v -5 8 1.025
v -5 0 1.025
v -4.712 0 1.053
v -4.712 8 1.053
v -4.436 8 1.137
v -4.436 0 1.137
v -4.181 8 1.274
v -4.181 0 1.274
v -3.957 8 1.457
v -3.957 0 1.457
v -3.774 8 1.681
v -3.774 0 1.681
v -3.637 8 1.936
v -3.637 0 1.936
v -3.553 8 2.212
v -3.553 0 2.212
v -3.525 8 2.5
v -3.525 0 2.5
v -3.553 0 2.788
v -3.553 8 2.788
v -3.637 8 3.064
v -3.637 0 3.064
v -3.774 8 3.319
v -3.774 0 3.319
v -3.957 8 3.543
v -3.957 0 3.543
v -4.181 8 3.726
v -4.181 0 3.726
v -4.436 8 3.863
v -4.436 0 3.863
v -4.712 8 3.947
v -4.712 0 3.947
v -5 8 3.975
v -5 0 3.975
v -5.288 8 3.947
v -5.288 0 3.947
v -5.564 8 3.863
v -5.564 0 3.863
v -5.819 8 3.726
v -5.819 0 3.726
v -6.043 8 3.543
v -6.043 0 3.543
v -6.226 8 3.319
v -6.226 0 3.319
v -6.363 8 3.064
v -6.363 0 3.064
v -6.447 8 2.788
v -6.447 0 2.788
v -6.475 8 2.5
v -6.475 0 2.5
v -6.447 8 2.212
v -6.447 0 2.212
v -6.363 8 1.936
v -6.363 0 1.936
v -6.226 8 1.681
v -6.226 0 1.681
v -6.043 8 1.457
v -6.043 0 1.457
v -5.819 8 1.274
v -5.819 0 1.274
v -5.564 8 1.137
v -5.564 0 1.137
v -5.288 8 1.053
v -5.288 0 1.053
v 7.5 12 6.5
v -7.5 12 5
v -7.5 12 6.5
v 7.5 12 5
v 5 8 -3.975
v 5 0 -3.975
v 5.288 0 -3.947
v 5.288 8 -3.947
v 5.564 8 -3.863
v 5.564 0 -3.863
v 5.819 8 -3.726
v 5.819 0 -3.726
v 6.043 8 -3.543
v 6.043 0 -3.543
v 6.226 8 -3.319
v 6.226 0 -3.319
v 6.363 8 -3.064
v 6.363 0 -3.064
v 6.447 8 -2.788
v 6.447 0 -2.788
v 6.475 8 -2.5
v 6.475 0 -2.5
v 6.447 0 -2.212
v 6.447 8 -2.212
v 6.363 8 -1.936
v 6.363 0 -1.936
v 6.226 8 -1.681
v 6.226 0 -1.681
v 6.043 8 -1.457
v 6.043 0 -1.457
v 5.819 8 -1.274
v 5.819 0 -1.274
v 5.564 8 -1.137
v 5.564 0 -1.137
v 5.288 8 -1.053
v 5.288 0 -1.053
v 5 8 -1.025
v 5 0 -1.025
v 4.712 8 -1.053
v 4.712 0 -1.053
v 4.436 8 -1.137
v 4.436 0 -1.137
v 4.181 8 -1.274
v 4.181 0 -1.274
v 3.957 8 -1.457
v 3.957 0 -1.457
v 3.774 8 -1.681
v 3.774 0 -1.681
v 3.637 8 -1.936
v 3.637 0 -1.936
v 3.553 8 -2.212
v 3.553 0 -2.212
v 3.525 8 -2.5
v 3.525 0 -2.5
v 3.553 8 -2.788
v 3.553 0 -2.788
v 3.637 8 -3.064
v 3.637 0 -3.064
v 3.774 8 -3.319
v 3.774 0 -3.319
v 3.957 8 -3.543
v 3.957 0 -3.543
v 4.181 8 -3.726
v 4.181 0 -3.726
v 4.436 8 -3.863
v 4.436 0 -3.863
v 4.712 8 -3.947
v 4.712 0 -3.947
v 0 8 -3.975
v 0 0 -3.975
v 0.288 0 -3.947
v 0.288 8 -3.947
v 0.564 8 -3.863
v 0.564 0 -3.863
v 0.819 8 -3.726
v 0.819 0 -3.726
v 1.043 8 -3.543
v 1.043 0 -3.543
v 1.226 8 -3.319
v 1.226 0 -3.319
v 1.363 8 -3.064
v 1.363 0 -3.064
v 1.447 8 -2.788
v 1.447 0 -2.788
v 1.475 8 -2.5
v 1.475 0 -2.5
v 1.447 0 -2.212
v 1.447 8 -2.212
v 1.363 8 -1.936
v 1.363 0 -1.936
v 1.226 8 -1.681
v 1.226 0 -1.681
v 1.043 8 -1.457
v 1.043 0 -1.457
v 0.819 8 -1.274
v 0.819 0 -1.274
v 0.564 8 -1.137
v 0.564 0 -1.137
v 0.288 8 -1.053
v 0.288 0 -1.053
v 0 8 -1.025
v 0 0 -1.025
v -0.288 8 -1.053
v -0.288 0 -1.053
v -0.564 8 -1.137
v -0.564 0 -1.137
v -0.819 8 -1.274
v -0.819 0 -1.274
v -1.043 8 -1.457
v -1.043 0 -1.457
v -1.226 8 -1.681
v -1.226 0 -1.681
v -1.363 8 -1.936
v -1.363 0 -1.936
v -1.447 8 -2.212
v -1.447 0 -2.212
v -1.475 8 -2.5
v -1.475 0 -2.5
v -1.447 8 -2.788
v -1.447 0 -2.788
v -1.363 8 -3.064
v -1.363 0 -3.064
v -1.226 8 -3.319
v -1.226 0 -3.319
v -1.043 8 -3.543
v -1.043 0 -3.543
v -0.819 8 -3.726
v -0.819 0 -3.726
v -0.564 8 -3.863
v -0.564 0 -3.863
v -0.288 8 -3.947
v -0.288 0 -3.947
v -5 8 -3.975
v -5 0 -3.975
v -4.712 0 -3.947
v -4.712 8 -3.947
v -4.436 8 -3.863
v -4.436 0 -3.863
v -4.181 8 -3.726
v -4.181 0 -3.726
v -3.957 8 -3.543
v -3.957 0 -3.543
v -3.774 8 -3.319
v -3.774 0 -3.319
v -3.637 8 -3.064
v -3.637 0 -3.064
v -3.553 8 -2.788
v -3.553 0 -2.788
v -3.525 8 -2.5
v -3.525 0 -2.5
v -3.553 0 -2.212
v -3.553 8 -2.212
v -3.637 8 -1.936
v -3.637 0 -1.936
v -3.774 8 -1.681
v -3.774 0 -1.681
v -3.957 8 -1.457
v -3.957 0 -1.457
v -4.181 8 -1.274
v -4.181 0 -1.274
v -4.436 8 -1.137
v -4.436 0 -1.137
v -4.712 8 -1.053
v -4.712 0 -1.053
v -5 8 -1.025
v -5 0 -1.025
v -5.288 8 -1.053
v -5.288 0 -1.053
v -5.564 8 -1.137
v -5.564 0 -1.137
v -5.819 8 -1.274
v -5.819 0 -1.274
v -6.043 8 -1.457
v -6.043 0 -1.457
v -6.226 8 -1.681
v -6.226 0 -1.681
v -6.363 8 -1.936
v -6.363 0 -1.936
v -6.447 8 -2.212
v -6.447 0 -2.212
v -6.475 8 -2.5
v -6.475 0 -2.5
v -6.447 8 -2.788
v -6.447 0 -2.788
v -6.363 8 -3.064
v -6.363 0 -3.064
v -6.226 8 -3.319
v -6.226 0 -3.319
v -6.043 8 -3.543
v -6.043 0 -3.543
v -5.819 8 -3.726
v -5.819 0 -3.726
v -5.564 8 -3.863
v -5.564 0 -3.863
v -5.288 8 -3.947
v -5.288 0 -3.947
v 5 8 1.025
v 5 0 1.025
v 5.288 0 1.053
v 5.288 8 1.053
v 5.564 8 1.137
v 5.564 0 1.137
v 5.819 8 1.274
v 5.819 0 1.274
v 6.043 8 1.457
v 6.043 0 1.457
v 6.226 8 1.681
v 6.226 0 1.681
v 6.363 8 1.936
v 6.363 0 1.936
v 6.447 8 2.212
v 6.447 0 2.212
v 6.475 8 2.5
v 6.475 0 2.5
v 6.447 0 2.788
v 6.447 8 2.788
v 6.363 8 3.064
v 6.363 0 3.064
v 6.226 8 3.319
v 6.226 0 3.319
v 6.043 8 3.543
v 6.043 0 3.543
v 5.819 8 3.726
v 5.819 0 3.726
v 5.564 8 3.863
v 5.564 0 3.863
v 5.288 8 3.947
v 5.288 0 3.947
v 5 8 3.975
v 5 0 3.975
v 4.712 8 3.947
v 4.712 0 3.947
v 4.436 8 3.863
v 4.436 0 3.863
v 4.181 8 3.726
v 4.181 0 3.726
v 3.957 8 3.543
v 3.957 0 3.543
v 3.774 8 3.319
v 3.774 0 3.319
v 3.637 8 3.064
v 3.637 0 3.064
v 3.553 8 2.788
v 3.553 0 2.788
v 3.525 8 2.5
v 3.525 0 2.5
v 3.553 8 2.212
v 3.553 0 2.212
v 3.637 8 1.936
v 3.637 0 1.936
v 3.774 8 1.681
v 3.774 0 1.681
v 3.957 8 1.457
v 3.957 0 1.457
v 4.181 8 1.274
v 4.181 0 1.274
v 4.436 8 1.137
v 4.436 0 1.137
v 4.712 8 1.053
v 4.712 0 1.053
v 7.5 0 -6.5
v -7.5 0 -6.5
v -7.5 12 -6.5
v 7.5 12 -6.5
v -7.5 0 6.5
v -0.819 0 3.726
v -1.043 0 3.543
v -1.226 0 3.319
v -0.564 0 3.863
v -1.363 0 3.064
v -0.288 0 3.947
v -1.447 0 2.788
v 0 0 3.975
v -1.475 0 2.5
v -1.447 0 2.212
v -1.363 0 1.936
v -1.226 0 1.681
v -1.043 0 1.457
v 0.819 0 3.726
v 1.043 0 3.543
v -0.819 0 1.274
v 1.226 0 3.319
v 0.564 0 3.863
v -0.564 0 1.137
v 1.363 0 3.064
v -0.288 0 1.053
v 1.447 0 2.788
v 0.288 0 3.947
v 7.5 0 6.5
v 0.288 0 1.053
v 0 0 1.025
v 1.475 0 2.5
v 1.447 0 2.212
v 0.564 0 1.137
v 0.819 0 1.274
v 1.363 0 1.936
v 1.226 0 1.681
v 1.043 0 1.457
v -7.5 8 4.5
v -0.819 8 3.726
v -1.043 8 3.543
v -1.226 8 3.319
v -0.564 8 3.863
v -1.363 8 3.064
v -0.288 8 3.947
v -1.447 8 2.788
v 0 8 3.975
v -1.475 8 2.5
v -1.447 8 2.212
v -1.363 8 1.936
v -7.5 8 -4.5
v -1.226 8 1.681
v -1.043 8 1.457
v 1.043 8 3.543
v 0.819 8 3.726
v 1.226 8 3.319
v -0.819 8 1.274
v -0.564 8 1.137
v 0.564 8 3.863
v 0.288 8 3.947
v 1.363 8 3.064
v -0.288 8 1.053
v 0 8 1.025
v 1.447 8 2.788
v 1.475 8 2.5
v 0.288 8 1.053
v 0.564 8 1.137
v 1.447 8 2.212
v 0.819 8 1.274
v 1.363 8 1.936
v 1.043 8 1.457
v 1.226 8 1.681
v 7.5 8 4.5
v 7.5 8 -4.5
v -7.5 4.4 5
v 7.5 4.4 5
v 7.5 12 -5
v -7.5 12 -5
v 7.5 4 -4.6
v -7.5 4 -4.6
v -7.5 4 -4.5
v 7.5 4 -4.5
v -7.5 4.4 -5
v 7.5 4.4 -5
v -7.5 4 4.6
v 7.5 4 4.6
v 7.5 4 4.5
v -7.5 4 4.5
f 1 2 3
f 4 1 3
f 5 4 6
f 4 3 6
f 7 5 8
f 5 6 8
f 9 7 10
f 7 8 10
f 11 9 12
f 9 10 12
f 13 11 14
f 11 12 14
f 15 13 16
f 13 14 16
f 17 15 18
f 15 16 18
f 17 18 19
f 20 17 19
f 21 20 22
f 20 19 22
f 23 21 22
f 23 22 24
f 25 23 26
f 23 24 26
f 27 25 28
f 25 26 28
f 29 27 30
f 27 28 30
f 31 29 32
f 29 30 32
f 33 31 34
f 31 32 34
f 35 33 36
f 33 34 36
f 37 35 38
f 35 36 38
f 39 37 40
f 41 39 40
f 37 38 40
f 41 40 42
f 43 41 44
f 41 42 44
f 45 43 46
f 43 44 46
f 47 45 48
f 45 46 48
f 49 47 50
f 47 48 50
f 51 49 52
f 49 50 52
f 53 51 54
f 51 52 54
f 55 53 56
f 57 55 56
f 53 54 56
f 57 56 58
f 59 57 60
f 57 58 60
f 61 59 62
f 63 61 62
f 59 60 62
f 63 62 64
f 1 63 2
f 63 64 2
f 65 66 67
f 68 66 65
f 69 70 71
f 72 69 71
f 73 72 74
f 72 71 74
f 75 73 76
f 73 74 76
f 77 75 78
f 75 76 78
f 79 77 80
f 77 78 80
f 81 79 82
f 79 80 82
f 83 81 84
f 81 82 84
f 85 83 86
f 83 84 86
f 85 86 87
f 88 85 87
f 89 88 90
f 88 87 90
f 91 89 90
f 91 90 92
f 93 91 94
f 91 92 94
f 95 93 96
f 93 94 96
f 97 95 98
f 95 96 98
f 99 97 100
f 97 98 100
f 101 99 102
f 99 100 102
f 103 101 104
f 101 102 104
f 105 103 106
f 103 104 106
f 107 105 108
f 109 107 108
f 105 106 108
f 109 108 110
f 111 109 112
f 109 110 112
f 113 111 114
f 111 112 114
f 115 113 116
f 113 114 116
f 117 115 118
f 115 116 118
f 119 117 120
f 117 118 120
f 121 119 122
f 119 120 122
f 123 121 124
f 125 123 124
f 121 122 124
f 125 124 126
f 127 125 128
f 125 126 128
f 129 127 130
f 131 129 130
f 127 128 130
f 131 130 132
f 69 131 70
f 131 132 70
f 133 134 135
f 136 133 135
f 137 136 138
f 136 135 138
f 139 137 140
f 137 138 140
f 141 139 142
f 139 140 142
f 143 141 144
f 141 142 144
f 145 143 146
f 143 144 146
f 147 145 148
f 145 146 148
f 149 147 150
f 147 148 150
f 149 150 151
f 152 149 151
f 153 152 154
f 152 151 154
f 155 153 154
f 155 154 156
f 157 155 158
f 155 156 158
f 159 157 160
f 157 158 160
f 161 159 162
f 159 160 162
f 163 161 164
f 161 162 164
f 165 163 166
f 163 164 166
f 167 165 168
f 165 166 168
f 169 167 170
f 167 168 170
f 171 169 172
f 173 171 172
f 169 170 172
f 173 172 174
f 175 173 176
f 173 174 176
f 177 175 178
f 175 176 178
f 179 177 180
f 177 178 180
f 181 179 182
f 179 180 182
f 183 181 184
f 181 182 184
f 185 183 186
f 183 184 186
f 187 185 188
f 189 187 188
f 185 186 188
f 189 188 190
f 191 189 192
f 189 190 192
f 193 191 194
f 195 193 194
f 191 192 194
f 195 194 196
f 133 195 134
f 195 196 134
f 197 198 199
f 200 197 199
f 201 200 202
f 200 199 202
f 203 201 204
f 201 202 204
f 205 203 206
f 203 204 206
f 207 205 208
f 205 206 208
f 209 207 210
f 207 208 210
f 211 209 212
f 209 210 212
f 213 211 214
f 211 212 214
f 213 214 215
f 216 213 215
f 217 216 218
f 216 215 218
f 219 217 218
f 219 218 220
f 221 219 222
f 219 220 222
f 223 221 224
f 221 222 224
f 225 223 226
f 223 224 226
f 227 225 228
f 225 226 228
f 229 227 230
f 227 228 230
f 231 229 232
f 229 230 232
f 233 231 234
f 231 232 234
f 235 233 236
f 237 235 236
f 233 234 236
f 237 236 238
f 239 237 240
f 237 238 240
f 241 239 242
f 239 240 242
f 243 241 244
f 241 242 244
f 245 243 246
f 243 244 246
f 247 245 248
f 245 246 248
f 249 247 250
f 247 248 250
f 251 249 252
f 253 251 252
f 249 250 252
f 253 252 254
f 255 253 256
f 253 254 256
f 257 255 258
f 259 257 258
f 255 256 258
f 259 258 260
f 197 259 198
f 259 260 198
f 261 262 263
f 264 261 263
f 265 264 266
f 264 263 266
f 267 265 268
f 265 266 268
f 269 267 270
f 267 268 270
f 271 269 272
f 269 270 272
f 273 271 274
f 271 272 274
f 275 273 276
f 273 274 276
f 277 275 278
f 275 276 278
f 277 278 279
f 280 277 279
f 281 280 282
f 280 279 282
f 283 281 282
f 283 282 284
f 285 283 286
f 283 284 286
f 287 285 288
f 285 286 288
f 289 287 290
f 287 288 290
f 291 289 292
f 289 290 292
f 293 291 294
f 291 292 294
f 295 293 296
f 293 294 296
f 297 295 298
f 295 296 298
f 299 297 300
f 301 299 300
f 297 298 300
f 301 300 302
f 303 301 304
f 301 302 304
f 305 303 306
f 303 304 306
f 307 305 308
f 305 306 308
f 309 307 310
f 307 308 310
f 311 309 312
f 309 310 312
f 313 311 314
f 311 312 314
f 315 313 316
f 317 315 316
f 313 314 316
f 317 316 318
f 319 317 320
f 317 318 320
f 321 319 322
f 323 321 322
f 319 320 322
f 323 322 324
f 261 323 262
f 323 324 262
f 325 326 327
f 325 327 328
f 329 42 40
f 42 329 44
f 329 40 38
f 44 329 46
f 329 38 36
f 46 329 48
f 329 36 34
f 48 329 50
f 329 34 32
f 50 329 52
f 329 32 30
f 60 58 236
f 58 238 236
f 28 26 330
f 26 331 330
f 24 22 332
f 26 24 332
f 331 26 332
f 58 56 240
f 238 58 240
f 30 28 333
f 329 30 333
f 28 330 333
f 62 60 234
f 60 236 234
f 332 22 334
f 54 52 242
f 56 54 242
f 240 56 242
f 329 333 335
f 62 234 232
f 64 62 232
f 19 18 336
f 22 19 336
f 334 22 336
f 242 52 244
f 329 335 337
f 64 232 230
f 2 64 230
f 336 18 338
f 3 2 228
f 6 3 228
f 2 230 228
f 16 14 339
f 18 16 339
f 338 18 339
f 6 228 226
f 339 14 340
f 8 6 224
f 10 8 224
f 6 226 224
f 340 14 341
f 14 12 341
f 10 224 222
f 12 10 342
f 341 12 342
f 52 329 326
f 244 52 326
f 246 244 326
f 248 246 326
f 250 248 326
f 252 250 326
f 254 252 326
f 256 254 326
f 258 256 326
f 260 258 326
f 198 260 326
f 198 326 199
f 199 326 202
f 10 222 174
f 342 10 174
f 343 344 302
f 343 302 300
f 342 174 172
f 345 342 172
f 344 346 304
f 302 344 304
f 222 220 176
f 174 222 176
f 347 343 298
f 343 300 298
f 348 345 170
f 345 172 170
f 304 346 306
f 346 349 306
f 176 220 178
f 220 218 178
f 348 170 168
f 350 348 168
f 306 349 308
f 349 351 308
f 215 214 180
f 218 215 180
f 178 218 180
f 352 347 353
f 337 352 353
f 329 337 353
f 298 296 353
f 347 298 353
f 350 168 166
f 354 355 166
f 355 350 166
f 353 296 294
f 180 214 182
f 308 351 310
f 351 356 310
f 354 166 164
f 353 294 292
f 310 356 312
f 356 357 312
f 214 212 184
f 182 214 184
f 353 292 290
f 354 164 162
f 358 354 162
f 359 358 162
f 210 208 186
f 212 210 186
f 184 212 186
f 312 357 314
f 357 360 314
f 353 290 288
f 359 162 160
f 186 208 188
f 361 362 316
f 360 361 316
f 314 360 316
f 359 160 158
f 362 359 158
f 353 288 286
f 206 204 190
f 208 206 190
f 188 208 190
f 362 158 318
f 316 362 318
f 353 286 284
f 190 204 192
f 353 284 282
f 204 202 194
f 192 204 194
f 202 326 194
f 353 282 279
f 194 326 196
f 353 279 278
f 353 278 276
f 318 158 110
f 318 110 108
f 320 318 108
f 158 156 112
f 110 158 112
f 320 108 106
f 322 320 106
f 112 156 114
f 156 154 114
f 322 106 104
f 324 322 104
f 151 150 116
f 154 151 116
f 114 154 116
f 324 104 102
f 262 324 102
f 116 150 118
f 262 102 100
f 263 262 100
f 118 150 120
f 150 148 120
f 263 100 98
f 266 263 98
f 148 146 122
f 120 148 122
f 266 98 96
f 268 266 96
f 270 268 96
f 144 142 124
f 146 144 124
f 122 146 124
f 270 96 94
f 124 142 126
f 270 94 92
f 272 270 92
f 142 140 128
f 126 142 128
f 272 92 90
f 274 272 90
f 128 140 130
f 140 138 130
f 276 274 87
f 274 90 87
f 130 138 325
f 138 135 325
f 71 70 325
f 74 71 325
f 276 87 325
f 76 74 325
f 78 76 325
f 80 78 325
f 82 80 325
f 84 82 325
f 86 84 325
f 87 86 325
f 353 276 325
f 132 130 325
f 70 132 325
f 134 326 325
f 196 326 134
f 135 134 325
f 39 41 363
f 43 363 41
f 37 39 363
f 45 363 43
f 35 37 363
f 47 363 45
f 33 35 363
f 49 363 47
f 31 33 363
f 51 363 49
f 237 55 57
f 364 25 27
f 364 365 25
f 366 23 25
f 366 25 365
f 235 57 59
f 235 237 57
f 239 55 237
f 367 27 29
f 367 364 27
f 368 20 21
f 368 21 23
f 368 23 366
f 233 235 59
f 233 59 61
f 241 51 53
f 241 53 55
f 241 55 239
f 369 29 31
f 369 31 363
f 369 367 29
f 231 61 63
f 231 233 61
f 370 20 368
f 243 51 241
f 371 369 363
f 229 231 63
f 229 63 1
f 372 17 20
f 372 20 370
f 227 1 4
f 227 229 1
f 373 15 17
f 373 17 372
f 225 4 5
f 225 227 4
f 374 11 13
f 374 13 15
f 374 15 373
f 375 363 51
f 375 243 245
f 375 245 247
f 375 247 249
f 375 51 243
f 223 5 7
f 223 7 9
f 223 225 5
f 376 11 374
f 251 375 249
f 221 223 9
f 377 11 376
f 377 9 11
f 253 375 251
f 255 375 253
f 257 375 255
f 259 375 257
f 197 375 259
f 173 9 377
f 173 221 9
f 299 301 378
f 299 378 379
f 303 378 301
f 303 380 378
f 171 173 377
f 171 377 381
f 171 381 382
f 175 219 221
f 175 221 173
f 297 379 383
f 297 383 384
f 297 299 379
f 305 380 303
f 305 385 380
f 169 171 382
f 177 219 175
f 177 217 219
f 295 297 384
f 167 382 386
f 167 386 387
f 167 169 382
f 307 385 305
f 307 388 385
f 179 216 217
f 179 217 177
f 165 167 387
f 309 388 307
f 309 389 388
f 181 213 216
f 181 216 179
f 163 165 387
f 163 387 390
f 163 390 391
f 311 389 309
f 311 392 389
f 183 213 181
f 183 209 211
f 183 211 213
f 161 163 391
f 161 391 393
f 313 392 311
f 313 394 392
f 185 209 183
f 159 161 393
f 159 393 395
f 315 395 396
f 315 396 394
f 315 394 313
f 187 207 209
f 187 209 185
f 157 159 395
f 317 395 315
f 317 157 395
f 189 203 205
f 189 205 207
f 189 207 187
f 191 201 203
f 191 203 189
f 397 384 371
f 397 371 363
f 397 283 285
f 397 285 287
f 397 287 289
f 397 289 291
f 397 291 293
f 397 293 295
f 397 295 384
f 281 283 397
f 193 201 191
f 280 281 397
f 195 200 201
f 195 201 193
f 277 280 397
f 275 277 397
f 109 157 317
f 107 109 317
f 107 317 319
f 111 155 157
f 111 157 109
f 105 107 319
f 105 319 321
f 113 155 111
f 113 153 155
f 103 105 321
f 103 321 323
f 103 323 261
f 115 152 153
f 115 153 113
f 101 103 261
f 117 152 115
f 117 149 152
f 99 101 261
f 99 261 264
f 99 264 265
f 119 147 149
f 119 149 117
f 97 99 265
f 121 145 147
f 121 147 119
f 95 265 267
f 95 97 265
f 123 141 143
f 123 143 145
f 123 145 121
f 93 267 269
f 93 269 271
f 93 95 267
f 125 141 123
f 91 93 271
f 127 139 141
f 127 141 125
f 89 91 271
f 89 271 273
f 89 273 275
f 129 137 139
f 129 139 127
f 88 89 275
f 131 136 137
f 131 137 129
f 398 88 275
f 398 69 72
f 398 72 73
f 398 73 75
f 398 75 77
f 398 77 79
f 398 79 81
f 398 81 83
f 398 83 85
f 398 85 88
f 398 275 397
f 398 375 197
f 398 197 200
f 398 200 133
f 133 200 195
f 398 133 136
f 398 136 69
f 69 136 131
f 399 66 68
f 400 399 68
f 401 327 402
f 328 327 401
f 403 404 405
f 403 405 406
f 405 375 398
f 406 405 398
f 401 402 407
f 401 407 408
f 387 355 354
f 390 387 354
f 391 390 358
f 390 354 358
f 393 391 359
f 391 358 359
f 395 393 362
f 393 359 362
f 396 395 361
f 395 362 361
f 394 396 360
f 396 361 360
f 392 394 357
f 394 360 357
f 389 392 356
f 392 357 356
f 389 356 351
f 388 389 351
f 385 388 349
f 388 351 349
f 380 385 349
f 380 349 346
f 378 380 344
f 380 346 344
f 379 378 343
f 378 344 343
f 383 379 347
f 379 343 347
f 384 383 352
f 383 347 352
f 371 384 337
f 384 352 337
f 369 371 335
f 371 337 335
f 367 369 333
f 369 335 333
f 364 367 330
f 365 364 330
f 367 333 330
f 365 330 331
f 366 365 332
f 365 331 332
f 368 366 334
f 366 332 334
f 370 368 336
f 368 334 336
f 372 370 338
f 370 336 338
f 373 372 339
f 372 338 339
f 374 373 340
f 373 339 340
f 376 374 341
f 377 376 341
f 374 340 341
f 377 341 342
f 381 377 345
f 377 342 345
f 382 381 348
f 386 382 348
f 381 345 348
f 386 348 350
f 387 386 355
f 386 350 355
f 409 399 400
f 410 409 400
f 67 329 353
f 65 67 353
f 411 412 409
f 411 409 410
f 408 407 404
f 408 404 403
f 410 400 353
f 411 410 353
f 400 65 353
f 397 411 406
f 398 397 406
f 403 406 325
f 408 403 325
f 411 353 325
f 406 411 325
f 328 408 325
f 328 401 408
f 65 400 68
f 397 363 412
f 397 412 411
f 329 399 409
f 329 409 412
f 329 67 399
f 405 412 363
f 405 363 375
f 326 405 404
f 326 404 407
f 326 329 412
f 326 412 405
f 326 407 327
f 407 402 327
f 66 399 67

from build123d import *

# Parameters (mm, degrees)
SKETCH1_W            = 15
SKETCH1_H            = 13
BOSS_EXTRUDE1_DEPTH  = 8
SKETCH8_W            = 15
SKETCH8_H            = 1.5
BOSS_EXTRUDE4_DEPTH  = 4
SKETCH9_W            = 15
SKETCH9_H            = 0.5
CUT_EXTRUDE3_DEPTH   = 4
CHAMFER1_SIZE        = 0.4
SKETCH4_R            = 1.475
CUT_EXTRUDE2_DEPTH   = 8
LPATTERN1_COUNT      = 3
LPATTERN1_PITCH      = 5
LPATTERN1_COUNT_DIR2 = 2
LPATTERN1_PITCH_DIR2 = 5


with BuildPart() as part:
    # Sketch1 → Boss-Extrude1 (new body)
    with BuildSketch(Plane(origin=(0, 0, 0), x_dir=(1, 0, 0), z_dir=(0, 1, 0))):
        Rectangle(SKETCH1_W, SKETCH1_H)
    extrude(amount=BOSS_EXTRUDE1_DEPTH)

    # Sketch8 → Boss-Extrude4 (add)
    with BuildSketch(Plane(origin=(0, 8, 0), x_dir=(1, 0, 0), z_dir=(0, 1, 0))):
        with Locations((0, 5.75)):
            Rectangle(SKETCH8_W, SKETCH8_H)
        with Locations((0, -5.75)):
            Rectangle(SKETCH8_W, SKETCH8_H)
    extrude(amount=BOSS_EXTRUDE4_DEPTH)

    # Sketch9 → Cut-Extrude3 (cut)
    with BuildSketch(Plane(origin=(0, 8, 0), x_dir=(1, 0, 0), z_dir=(0, 1, 0))):
        with Locations((0, 4.75)):
            Rectangle(SKETCH9_W, SKETCH9_H)
        with Locations((0, -4.75)):
            Rectangle(SKETCH9_W, SKETCH9_H)
    extrude(amount=-CUT_EXTRUDE3_DEPTH, mode=Mode.SUBTRACT)

    # Chamfer1
    chamfer1_edges = [part.edges().sort_by_distance(p)[0] for p in [
        (0, 4, -5),
        (0, 4, 5),
    ]]
    chamfer(chamfer1_edges, length=CHAMFER1_SIZE)

    # Sketch4 → Cut-Extrude2 (cut)
    with BuildSketch(Plane.XZ):
        with Locations(Location((-5, 2.5, 0), (0, 0, 270))):
            Circle(SKETCH4_R)
    cut_extrude2 = extrude(amount=-CUT_EXTRUDE2_DEPTH, mode=Mode.SUBTRACT)

    # LPattern1: Cut-Extrude2 3 × 2
    with Locations(*[(i * LPATTERN1_PITCH, 0, -j * LPATTERN1_PITCH_DIR2) for i in range(LPATTERN1_COUNT) for j in range(LPATTERN1_COUNT_DIR2) if (i, j) != (0, 0)]):
        add(cut_extrude2, mode=Mode.SUBTRACT)


solid = part.part
